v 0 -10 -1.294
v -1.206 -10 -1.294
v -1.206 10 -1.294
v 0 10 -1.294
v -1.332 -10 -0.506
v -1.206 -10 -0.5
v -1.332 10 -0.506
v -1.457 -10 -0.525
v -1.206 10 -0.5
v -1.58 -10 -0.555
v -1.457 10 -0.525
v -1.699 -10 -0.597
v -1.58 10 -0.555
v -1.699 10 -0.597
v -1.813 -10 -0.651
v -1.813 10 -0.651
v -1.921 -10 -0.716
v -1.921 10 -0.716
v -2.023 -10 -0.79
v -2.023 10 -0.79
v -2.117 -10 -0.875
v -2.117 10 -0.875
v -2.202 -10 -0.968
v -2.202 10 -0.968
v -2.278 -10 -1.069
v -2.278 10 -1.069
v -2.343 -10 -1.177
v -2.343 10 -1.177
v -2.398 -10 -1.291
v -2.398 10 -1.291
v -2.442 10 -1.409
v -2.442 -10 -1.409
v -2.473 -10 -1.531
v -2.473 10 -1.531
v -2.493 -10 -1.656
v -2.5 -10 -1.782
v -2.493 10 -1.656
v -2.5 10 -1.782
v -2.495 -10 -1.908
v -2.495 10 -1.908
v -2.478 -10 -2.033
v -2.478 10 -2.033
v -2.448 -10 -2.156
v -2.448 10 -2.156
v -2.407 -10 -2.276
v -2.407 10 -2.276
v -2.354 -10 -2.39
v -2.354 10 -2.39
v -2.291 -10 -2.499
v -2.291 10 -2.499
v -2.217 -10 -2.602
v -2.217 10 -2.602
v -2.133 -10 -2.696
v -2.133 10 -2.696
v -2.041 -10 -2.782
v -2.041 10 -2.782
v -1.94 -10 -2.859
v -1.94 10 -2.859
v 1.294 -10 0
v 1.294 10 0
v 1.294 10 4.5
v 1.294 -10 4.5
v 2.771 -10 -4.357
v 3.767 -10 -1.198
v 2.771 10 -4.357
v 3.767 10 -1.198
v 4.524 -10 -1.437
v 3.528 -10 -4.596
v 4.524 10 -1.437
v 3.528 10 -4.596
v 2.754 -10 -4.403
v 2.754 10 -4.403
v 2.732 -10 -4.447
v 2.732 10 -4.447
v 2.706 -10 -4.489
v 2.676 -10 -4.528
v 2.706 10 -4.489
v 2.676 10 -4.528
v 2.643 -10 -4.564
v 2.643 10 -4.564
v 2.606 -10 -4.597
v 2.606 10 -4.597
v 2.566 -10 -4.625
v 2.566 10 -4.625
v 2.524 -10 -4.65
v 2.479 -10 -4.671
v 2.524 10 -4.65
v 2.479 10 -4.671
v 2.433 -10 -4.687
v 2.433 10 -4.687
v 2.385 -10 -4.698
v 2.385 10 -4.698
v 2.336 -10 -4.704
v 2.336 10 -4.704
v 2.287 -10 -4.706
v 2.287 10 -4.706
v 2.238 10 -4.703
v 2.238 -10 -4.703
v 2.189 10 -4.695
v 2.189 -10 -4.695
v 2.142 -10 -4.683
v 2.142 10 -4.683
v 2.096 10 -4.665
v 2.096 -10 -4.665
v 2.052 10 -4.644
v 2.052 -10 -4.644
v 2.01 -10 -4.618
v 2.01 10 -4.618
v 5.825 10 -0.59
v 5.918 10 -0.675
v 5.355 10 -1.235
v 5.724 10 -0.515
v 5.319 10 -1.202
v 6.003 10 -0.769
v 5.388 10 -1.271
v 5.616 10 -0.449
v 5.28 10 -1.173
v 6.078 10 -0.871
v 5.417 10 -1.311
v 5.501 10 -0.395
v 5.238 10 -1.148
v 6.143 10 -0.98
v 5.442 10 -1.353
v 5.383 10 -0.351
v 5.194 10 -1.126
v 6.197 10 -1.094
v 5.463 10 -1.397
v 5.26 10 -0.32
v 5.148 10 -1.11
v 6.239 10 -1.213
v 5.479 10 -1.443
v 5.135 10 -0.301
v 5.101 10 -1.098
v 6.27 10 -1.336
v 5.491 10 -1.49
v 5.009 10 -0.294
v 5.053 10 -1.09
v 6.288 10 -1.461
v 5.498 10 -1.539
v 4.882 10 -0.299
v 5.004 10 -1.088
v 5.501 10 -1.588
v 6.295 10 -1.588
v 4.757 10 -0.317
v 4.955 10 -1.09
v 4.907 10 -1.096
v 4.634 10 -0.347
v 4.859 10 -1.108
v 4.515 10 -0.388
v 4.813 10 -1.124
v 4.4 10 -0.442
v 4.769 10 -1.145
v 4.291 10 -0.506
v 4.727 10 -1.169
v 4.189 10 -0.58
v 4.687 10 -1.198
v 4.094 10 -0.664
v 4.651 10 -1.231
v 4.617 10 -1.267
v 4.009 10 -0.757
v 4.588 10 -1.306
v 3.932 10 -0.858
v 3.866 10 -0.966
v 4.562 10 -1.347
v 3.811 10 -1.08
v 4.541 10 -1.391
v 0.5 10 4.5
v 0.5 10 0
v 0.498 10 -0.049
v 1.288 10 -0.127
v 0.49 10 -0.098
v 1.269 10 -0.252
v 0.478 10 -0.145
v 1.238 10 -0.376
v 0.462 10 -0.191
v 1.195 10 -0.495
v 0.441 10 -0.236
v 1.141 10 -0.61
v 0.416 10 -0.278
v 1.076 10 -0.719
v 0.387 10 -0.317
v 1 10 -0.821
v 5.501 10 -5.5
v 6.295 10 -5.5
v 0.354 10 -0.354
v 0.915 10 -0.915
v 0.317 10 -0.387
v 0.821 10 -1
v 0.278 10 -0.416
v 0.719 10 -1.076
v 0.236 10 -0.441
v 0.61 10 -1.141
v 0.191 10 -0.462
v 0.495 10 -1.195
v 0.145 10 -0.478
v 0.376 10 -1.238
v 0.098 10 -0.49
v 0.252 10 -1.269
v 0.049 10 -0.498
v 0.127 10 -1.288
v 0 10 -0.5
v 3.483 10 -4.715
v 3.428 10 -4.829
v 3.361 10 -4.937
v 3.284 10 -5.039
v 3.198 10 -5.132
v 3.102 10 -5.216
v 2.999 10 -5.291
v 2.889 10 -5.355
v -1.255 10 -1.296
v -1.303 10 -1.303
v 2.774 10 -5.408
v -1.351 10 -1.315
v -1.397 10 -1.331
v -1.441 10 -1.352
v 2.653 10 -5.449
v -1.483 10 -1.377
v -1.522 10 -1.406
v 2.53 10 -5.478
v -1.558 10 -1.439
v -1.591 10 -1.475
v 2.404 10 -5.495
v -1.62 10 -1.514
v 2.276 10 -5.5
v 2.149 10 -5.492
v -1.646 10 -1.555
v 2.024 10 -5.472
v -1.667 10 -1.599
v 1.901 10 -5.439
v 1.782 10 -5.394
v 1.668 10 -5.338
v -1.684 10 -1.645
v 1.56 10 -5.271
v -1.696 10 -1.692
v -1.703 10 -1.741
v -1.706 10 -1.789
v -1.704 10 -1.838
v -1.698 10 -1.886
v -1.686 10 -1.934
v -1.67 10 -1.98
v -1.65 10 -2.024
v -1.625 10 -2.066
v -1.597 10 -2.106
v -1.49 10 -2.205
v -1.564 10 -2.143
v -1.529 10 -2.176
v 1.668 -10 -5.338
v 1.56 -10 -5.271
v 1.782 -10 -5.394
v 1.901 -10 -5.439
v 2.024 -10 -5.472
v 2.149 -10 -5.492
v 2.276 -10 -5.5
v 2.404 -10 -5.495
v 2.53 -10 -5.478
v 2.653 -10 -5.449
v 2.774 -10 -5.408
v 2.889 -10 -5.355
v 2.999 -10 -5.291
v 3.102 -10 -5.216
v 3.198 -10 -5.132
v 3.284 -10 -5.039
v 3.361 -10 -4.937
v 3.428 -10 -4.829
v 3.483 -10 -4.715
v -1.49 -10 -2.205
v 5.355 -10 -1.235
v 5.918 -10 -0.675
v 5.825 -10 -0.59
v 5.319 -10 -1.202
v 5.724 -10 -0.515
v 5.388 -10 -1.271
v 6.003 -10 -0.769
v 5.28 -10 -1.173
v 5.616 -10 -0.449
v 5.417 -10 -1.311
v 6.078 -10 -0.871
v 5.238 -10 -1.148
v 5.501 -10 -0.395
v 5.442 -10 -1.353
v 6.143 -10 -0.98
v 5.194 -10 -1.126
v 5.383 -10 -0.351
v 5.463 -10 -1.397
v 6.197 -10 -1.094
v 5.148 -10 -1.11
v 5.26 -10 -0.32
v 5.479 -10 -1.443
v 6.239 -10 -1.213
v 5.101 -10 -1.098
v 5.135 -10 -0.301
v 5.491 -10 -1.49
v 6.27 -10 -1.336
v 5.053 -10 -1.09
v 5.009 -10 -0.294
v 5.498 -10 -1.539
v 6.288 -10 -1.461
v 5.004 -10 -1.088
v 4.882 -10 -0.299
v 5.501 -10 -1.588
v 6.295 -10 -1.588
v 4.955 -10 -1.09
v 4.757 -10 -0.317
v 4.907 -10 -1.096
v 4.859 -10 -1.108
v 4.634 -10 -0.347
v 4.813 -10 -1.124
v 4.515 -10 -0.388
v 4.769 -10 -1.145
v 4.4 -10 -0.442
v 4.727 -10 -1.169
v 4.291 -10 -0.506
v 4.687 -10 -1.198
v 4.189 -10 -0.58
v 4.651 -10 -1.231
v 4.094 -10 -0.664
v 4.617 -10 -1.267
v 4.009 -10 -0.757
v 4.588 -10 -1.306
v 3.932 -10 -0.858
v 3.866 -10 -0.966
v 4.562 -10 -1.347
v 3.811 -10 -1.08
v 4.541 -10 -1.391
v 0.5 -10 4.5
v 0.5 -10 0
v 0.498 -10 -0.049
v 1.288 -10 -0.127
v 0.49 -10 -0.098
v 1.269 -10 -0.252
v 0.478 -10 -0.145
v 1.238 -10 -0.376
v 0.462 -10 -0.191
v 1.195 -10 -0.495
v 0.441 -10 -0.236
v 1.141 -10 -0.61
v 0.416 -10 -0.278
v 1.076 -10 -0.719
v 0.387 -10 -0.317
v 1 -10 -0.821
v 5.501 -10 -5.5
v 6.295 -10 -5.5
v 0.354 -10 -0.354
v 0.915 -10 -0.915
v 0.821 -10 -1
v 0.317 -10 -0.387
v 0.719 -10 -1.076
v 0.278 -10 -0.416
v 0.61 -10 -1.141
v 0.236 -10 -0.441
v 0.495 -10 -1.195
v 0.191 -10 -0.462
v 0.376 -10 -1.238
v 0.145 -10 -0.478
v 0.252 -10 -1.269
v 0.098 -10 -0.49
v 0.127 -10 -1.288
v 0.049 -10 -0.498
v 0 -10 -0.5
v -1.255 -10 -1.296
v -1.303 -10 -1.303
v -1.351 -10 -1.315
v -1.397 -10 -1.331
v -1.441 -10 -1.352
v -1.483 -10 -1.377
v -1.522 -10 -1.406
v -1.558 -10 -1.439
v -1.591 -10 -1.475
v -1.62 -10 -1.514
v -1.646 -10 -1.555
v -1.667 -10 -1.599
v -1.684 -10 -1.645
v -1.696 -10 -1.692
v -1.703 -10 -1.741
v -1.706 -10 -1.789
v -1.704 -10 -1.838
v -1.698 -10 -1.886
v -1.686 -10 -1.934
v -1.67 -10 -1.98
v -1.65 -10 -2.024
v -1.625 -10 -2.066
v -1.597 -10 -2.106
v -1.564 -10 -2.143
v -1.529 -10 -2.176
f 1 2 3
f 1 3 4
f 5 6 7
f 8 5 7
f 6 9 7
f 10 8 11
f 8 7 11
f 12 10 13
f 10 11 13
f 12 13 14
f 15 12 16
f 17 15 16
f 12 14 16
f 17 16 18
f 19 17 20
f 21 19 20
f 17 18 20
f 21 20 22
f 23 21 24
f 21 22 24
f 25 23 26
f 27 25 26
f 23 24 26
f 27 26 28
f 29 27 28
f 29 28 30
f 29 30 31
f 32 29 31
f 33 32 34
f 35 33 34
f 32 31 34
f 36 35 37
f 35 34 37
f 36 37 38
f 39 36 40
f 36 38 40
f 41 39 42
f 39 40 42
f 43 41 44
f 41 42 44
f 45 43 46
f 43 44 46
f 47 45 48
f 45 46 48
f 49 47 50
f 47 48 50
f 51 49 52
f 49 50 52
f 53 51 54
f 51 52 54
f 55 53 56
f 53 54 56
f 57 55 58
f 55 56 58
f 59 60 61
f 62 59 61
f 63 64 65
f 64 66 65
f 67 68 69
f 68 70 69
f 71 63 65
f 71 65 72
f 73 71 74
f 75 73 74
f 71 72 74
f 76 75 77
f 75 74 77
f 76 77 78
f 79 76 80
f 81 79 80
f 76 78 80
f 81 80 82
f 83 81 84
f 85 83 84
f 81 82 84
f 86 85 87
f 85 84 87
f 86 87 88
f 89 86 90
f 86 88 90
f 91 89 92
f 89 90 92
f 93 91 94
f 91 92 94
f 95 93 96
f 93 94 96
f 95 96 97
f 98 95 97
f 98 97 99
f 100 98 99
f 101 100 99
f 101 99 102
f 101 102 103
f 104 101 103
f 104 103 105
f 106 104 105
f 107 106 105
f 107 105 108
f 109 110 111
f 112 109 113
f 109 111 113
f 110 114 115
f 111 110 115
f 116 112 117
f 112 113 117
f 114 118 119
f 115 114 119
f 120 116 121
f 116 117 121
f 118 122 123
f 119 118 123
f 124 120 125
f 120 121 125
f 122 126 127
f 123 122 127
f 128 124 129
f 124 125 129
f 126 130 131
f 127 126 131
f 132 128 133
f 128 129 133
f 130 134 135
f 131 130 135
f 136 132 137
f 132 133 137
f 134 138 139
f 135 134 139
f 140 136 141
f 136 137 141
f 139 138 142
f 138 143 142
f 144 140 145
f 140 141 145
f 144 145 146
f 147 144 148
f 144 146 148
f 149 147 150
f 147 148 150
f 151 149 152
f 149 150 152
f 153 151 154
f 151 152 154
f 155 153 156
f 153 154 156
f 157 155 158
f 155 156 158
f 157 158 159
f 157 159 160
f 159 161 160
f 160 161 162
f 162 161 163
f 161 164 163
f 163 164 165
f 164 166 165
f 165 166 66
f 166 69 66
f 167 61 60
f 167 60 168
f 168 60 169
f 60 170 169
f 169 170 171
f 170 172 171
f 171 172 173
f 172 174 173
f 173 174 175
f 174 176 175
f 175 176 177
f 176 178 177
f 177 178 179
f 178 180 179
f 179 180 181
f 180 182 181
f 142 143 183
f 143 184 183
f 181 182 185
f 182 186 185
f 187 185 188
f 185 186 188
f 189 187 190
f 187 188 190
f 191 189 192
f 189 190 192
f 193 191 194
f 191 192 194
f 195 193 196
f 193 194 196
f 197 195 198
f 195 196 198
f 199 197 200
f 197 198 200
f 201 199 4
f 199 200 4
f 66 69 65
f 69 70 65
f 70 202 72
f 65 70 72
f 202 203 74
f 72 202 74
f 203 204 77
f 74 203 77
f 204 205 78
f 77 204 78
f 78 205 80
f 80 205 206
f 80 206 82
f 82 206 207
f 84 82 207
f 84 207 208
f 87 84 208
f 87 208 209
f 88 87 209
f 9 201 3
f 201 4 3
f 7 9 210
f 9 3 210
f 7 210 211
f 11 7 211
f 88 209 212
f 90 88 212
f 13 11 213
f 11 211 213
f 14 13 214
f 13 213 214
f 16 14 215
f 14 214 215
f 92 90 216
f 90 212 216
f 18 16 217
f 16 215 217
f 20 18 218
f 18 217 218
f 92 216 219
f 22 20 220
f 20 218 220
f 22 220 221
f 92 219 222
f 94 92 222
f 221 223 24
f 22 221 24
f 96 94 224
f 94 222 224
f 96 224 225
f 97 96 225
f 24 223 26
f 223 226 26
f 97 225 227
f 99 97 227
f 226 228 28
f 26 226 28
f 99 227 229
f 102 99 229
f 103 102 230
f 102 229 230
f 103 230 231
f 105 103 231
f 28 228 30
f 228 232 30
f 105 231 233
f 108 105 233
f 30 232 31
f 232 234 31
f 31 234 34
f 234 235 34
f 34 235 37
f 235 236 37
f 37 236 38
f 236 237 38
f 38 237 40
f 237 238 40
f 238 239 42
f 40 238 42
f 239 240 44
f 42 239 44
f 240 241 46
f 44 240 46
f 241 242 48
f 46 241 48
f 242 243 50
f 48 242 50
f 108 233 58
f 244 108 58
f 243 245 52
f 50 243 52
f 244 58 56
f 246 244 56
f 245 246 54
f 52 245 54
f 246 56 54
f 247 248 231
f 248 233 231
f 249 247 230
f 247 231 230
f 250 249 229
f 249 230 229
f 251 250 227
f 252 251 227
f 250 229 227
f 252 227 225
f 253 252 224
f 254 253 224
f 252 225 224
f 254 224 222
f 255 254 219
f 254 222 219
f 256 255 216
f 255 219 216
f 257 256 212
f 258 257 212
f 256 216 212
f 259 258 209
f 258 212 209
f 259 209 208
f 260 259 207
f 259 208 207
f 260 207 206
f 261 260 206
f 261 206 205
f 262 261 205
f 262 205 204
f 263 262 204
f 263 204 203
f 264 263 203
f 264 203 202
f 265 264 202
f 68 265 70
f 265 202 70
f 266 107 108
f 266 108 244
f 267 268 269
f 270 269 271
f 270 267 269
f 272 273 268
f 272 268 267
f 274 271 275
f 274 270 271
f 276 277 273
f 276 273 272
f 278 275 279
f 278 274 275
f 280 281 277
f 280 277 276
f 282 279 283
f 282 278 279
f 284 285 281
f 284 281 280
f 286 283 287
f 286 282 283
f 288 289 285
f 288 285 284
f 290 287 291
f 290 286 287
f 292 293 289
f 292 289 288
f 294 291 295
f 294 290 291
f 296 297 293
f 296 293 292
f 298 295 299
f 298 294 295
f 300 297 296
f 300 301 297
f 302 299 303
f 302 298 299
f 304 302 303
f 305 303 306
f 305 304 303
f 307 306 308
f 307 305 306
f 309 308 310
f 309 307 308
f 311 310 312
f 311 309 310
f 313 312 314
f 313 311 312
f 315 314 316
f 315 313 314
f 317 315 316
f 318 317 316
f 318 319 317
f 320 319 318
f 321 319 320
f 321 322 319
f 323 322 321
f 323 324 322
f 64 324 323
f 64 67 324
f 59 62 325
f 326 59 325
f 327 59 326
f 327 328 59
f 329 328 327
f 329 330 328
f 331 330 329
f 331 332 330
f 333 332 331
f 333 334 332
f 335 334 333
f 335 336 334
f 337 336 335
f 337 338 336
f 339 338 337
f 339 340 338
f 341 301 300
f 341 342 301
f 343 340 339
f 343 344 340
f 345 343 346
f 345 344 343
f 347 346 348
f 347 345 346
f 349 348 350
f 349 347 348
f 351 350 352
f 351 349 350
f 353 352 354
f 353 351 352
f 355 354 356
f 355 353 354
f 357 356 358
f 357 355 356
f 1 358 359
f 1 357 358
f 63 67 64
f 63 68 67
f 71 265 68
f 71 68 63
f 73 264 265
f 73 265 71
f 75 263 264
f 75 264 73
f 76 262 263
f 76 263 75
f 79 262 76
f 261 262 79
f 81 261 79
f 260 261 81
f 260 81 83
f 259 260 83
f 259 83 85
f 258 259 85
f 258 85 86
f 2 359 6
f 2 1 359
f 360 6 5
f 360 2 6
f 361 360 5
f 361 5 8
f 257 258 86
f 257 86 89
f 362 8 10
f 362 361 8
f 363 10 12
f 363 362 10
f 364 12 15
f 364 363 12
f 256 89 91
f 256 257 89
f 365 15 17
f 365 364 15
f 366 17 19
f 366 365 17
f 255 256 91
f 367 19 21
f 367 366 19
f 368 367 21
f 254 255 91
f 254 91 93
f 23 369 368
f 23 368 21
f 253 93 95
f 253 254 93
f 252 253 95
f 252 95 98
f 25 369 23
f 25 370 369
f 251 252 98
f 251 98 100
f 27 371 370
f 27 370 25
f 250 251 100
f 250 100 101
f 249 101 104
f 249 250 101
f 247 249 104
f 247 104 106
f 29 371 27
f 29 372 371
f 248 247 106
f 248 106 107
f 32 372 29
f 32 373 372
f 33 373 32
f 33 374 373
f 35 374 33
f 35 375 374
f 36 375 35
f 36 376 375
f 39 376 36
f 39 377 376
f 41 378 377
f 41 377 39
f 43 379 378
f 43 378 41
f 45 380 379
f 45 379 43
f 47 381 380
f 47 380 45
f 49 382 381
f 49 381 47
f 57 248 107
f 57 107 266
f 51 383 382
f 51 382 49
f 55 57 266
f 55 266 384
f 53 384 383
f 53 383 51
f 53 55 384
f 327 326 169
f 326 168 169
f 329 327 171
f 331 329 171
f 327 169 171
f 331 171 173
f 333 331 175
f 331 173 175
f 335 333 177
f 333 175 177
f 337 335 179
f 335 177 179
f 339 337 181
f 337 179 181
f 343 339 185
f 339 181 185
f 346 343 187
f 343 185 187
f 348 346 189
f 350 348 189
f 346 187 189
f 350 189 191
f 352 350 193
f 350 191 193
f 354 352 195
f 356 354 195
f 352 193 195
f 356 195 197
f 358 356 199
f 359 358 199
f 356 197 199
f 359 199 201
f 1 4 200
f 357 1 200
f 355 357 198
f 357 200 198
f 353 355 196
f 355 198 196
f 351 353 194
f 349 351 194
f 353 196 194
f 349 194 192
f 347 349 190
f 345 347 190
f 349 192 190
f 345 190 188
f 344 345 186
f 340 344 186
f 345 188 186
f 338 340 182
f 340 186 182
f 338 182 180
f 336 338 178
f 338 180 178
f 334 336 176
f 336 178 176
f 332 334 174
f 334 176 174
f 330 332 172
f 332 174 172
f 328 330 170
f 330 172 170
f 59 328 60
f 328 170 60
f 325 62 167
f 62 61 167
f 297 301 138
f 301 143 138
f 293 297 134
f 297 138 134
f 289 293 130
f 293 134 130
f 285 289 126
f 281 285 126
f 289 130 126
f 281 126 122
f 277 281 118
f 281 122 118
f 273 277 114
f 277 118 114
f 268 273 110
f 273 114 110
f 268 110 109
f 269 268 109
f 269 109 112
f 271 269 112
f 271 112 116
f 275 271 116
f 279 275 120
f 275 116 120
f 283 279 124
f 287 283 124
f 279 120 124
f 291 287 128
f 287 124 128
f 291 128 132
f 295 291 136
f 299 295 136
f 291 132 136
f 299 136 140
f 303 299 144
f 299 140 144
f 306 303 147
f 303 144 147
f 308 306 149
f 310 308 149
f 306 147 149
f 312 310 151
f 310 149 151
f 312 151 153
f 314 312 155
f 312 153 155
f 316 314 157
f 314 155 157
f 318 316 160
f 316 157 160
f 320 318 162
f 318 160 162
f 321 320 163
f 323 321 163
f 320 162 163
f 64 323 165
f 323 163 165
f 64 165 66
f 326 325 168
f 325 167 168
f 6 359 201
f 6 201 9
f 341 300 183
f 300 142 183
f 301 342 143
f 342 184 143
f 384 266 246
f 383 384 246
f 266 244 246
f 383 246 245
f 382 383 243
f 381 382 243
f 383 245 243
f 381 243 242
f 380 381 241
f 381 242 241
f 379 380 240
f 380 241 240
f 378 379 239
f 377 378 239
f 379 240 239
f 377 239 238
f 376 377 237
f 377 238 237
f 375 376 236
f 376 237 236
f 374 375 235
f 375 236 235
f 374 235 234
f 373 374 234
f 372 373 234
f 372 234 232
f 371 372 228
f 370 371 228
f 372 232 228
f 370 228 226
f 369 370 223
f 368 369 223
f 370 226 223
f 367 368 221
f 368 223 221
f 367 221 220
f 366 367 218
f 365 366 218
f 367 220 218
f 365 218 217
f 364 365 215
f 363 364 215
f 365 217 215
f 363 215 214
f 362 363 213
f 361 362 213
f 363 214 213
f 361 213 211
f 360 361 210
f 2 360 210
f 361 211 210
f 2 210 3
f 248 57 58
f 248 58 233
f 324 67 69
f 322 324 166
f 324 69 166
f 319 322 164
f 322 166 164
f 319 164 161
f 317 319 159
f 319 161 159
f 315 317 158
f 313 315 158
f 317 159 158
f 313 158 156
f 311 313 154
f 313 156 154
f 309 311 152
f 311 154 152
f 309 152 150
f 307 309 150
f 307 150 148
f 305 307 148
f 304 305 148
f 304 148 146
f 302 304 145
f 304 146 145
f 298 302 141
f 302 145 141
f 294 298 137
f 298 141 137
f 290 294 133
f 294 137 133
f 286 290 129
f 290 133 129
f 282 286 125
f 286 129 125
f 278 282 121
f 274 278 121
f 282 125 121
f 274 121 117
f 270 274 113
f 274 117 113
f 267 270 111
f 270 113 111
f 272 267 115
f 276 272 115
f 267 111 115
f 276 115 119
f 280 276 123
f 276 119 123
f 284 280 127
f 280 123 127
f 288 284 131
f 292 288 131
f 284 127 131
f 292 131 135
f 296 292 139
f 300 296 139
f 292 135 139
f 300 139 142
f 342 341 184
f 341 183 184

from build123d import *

# Parameters (mm, degrees)
BOSS_EXTRUDE1_DEPTH = 10


with BuildPart() as part:
    # Sketch1 → Boss-Extrude1 (new, symmetric)
    with BuildSketch(Plane(origin=(0, 0, 0), x_dir=(1, 0, 0), z_dir=(0, 1, 0))):
        with BuildLine():
            Line((1.29375, 0), (1.29375, -4.5))
            Line((1.29375, -4.5), (0.5, -4.5))
            Line((0.5, -4.5), (0.5, 0))
            ThreePointArc((0.5, 0), (0.353553391, 0.353553391), (0, 0.5))
            Line((0, 0.5), (-1.20625, 0.5))
            ThreePointArc((-1.20625, 0.5), (-2.441545823, 1.409259047), (-1.940487786, 2.858965441))
            Line((-1.940487786, 2.858965441), (1.559512214, 5.271465441))
            ThreePointArc((1.559512214, 5.271465441), (2.714013578, 5.429837997), (3.52755254, 4.595506155))
            Line((3.52755254, 4.595506155), (4.524019527, 1.437062839))
            ThreePointArc((4.524019527, 1.437062839), (5.076956782, 1.093325967), (5.500851427, 1.5875))
            Line((5.500851427, 1.5875), (5.500851427, 5.5))
            Line((5.500851427, 5.5), (6.294601427, 5.5))
            Line((6.294601427, 5.5), (6.294601427, 1.5875))
            ThreePointArc((6.294601427, 1.5875), (5.197774033, 0.30882469), (3.767048886, 1.198243845))
            Line((3.767048886, 1.198243845), (2.7705819, 4.356687161))
            ThreePointArc((2.7705819, 4.356687161), (2.456170707, 4.67913425), (2.009986604, 4.617927465))
            Line((2.009986604, 4.617927465), (-1.490013396, 2.205427465))
            ThreePointArc((-1.490013396, 2.205427465), (-1.683659014, 1.645154463), (-1.20625, 1.29375))
            Line((-1.20625, 1.29375), (0, 1.29375))
            ThreePointArc((0, 1.29375), (0.914819398, 0.914819398), (1.29375, 0))
        make_face()
    extrude(amount=BOSS_EXTRUDE1_DEPTH, both=True)


solid = part.part
